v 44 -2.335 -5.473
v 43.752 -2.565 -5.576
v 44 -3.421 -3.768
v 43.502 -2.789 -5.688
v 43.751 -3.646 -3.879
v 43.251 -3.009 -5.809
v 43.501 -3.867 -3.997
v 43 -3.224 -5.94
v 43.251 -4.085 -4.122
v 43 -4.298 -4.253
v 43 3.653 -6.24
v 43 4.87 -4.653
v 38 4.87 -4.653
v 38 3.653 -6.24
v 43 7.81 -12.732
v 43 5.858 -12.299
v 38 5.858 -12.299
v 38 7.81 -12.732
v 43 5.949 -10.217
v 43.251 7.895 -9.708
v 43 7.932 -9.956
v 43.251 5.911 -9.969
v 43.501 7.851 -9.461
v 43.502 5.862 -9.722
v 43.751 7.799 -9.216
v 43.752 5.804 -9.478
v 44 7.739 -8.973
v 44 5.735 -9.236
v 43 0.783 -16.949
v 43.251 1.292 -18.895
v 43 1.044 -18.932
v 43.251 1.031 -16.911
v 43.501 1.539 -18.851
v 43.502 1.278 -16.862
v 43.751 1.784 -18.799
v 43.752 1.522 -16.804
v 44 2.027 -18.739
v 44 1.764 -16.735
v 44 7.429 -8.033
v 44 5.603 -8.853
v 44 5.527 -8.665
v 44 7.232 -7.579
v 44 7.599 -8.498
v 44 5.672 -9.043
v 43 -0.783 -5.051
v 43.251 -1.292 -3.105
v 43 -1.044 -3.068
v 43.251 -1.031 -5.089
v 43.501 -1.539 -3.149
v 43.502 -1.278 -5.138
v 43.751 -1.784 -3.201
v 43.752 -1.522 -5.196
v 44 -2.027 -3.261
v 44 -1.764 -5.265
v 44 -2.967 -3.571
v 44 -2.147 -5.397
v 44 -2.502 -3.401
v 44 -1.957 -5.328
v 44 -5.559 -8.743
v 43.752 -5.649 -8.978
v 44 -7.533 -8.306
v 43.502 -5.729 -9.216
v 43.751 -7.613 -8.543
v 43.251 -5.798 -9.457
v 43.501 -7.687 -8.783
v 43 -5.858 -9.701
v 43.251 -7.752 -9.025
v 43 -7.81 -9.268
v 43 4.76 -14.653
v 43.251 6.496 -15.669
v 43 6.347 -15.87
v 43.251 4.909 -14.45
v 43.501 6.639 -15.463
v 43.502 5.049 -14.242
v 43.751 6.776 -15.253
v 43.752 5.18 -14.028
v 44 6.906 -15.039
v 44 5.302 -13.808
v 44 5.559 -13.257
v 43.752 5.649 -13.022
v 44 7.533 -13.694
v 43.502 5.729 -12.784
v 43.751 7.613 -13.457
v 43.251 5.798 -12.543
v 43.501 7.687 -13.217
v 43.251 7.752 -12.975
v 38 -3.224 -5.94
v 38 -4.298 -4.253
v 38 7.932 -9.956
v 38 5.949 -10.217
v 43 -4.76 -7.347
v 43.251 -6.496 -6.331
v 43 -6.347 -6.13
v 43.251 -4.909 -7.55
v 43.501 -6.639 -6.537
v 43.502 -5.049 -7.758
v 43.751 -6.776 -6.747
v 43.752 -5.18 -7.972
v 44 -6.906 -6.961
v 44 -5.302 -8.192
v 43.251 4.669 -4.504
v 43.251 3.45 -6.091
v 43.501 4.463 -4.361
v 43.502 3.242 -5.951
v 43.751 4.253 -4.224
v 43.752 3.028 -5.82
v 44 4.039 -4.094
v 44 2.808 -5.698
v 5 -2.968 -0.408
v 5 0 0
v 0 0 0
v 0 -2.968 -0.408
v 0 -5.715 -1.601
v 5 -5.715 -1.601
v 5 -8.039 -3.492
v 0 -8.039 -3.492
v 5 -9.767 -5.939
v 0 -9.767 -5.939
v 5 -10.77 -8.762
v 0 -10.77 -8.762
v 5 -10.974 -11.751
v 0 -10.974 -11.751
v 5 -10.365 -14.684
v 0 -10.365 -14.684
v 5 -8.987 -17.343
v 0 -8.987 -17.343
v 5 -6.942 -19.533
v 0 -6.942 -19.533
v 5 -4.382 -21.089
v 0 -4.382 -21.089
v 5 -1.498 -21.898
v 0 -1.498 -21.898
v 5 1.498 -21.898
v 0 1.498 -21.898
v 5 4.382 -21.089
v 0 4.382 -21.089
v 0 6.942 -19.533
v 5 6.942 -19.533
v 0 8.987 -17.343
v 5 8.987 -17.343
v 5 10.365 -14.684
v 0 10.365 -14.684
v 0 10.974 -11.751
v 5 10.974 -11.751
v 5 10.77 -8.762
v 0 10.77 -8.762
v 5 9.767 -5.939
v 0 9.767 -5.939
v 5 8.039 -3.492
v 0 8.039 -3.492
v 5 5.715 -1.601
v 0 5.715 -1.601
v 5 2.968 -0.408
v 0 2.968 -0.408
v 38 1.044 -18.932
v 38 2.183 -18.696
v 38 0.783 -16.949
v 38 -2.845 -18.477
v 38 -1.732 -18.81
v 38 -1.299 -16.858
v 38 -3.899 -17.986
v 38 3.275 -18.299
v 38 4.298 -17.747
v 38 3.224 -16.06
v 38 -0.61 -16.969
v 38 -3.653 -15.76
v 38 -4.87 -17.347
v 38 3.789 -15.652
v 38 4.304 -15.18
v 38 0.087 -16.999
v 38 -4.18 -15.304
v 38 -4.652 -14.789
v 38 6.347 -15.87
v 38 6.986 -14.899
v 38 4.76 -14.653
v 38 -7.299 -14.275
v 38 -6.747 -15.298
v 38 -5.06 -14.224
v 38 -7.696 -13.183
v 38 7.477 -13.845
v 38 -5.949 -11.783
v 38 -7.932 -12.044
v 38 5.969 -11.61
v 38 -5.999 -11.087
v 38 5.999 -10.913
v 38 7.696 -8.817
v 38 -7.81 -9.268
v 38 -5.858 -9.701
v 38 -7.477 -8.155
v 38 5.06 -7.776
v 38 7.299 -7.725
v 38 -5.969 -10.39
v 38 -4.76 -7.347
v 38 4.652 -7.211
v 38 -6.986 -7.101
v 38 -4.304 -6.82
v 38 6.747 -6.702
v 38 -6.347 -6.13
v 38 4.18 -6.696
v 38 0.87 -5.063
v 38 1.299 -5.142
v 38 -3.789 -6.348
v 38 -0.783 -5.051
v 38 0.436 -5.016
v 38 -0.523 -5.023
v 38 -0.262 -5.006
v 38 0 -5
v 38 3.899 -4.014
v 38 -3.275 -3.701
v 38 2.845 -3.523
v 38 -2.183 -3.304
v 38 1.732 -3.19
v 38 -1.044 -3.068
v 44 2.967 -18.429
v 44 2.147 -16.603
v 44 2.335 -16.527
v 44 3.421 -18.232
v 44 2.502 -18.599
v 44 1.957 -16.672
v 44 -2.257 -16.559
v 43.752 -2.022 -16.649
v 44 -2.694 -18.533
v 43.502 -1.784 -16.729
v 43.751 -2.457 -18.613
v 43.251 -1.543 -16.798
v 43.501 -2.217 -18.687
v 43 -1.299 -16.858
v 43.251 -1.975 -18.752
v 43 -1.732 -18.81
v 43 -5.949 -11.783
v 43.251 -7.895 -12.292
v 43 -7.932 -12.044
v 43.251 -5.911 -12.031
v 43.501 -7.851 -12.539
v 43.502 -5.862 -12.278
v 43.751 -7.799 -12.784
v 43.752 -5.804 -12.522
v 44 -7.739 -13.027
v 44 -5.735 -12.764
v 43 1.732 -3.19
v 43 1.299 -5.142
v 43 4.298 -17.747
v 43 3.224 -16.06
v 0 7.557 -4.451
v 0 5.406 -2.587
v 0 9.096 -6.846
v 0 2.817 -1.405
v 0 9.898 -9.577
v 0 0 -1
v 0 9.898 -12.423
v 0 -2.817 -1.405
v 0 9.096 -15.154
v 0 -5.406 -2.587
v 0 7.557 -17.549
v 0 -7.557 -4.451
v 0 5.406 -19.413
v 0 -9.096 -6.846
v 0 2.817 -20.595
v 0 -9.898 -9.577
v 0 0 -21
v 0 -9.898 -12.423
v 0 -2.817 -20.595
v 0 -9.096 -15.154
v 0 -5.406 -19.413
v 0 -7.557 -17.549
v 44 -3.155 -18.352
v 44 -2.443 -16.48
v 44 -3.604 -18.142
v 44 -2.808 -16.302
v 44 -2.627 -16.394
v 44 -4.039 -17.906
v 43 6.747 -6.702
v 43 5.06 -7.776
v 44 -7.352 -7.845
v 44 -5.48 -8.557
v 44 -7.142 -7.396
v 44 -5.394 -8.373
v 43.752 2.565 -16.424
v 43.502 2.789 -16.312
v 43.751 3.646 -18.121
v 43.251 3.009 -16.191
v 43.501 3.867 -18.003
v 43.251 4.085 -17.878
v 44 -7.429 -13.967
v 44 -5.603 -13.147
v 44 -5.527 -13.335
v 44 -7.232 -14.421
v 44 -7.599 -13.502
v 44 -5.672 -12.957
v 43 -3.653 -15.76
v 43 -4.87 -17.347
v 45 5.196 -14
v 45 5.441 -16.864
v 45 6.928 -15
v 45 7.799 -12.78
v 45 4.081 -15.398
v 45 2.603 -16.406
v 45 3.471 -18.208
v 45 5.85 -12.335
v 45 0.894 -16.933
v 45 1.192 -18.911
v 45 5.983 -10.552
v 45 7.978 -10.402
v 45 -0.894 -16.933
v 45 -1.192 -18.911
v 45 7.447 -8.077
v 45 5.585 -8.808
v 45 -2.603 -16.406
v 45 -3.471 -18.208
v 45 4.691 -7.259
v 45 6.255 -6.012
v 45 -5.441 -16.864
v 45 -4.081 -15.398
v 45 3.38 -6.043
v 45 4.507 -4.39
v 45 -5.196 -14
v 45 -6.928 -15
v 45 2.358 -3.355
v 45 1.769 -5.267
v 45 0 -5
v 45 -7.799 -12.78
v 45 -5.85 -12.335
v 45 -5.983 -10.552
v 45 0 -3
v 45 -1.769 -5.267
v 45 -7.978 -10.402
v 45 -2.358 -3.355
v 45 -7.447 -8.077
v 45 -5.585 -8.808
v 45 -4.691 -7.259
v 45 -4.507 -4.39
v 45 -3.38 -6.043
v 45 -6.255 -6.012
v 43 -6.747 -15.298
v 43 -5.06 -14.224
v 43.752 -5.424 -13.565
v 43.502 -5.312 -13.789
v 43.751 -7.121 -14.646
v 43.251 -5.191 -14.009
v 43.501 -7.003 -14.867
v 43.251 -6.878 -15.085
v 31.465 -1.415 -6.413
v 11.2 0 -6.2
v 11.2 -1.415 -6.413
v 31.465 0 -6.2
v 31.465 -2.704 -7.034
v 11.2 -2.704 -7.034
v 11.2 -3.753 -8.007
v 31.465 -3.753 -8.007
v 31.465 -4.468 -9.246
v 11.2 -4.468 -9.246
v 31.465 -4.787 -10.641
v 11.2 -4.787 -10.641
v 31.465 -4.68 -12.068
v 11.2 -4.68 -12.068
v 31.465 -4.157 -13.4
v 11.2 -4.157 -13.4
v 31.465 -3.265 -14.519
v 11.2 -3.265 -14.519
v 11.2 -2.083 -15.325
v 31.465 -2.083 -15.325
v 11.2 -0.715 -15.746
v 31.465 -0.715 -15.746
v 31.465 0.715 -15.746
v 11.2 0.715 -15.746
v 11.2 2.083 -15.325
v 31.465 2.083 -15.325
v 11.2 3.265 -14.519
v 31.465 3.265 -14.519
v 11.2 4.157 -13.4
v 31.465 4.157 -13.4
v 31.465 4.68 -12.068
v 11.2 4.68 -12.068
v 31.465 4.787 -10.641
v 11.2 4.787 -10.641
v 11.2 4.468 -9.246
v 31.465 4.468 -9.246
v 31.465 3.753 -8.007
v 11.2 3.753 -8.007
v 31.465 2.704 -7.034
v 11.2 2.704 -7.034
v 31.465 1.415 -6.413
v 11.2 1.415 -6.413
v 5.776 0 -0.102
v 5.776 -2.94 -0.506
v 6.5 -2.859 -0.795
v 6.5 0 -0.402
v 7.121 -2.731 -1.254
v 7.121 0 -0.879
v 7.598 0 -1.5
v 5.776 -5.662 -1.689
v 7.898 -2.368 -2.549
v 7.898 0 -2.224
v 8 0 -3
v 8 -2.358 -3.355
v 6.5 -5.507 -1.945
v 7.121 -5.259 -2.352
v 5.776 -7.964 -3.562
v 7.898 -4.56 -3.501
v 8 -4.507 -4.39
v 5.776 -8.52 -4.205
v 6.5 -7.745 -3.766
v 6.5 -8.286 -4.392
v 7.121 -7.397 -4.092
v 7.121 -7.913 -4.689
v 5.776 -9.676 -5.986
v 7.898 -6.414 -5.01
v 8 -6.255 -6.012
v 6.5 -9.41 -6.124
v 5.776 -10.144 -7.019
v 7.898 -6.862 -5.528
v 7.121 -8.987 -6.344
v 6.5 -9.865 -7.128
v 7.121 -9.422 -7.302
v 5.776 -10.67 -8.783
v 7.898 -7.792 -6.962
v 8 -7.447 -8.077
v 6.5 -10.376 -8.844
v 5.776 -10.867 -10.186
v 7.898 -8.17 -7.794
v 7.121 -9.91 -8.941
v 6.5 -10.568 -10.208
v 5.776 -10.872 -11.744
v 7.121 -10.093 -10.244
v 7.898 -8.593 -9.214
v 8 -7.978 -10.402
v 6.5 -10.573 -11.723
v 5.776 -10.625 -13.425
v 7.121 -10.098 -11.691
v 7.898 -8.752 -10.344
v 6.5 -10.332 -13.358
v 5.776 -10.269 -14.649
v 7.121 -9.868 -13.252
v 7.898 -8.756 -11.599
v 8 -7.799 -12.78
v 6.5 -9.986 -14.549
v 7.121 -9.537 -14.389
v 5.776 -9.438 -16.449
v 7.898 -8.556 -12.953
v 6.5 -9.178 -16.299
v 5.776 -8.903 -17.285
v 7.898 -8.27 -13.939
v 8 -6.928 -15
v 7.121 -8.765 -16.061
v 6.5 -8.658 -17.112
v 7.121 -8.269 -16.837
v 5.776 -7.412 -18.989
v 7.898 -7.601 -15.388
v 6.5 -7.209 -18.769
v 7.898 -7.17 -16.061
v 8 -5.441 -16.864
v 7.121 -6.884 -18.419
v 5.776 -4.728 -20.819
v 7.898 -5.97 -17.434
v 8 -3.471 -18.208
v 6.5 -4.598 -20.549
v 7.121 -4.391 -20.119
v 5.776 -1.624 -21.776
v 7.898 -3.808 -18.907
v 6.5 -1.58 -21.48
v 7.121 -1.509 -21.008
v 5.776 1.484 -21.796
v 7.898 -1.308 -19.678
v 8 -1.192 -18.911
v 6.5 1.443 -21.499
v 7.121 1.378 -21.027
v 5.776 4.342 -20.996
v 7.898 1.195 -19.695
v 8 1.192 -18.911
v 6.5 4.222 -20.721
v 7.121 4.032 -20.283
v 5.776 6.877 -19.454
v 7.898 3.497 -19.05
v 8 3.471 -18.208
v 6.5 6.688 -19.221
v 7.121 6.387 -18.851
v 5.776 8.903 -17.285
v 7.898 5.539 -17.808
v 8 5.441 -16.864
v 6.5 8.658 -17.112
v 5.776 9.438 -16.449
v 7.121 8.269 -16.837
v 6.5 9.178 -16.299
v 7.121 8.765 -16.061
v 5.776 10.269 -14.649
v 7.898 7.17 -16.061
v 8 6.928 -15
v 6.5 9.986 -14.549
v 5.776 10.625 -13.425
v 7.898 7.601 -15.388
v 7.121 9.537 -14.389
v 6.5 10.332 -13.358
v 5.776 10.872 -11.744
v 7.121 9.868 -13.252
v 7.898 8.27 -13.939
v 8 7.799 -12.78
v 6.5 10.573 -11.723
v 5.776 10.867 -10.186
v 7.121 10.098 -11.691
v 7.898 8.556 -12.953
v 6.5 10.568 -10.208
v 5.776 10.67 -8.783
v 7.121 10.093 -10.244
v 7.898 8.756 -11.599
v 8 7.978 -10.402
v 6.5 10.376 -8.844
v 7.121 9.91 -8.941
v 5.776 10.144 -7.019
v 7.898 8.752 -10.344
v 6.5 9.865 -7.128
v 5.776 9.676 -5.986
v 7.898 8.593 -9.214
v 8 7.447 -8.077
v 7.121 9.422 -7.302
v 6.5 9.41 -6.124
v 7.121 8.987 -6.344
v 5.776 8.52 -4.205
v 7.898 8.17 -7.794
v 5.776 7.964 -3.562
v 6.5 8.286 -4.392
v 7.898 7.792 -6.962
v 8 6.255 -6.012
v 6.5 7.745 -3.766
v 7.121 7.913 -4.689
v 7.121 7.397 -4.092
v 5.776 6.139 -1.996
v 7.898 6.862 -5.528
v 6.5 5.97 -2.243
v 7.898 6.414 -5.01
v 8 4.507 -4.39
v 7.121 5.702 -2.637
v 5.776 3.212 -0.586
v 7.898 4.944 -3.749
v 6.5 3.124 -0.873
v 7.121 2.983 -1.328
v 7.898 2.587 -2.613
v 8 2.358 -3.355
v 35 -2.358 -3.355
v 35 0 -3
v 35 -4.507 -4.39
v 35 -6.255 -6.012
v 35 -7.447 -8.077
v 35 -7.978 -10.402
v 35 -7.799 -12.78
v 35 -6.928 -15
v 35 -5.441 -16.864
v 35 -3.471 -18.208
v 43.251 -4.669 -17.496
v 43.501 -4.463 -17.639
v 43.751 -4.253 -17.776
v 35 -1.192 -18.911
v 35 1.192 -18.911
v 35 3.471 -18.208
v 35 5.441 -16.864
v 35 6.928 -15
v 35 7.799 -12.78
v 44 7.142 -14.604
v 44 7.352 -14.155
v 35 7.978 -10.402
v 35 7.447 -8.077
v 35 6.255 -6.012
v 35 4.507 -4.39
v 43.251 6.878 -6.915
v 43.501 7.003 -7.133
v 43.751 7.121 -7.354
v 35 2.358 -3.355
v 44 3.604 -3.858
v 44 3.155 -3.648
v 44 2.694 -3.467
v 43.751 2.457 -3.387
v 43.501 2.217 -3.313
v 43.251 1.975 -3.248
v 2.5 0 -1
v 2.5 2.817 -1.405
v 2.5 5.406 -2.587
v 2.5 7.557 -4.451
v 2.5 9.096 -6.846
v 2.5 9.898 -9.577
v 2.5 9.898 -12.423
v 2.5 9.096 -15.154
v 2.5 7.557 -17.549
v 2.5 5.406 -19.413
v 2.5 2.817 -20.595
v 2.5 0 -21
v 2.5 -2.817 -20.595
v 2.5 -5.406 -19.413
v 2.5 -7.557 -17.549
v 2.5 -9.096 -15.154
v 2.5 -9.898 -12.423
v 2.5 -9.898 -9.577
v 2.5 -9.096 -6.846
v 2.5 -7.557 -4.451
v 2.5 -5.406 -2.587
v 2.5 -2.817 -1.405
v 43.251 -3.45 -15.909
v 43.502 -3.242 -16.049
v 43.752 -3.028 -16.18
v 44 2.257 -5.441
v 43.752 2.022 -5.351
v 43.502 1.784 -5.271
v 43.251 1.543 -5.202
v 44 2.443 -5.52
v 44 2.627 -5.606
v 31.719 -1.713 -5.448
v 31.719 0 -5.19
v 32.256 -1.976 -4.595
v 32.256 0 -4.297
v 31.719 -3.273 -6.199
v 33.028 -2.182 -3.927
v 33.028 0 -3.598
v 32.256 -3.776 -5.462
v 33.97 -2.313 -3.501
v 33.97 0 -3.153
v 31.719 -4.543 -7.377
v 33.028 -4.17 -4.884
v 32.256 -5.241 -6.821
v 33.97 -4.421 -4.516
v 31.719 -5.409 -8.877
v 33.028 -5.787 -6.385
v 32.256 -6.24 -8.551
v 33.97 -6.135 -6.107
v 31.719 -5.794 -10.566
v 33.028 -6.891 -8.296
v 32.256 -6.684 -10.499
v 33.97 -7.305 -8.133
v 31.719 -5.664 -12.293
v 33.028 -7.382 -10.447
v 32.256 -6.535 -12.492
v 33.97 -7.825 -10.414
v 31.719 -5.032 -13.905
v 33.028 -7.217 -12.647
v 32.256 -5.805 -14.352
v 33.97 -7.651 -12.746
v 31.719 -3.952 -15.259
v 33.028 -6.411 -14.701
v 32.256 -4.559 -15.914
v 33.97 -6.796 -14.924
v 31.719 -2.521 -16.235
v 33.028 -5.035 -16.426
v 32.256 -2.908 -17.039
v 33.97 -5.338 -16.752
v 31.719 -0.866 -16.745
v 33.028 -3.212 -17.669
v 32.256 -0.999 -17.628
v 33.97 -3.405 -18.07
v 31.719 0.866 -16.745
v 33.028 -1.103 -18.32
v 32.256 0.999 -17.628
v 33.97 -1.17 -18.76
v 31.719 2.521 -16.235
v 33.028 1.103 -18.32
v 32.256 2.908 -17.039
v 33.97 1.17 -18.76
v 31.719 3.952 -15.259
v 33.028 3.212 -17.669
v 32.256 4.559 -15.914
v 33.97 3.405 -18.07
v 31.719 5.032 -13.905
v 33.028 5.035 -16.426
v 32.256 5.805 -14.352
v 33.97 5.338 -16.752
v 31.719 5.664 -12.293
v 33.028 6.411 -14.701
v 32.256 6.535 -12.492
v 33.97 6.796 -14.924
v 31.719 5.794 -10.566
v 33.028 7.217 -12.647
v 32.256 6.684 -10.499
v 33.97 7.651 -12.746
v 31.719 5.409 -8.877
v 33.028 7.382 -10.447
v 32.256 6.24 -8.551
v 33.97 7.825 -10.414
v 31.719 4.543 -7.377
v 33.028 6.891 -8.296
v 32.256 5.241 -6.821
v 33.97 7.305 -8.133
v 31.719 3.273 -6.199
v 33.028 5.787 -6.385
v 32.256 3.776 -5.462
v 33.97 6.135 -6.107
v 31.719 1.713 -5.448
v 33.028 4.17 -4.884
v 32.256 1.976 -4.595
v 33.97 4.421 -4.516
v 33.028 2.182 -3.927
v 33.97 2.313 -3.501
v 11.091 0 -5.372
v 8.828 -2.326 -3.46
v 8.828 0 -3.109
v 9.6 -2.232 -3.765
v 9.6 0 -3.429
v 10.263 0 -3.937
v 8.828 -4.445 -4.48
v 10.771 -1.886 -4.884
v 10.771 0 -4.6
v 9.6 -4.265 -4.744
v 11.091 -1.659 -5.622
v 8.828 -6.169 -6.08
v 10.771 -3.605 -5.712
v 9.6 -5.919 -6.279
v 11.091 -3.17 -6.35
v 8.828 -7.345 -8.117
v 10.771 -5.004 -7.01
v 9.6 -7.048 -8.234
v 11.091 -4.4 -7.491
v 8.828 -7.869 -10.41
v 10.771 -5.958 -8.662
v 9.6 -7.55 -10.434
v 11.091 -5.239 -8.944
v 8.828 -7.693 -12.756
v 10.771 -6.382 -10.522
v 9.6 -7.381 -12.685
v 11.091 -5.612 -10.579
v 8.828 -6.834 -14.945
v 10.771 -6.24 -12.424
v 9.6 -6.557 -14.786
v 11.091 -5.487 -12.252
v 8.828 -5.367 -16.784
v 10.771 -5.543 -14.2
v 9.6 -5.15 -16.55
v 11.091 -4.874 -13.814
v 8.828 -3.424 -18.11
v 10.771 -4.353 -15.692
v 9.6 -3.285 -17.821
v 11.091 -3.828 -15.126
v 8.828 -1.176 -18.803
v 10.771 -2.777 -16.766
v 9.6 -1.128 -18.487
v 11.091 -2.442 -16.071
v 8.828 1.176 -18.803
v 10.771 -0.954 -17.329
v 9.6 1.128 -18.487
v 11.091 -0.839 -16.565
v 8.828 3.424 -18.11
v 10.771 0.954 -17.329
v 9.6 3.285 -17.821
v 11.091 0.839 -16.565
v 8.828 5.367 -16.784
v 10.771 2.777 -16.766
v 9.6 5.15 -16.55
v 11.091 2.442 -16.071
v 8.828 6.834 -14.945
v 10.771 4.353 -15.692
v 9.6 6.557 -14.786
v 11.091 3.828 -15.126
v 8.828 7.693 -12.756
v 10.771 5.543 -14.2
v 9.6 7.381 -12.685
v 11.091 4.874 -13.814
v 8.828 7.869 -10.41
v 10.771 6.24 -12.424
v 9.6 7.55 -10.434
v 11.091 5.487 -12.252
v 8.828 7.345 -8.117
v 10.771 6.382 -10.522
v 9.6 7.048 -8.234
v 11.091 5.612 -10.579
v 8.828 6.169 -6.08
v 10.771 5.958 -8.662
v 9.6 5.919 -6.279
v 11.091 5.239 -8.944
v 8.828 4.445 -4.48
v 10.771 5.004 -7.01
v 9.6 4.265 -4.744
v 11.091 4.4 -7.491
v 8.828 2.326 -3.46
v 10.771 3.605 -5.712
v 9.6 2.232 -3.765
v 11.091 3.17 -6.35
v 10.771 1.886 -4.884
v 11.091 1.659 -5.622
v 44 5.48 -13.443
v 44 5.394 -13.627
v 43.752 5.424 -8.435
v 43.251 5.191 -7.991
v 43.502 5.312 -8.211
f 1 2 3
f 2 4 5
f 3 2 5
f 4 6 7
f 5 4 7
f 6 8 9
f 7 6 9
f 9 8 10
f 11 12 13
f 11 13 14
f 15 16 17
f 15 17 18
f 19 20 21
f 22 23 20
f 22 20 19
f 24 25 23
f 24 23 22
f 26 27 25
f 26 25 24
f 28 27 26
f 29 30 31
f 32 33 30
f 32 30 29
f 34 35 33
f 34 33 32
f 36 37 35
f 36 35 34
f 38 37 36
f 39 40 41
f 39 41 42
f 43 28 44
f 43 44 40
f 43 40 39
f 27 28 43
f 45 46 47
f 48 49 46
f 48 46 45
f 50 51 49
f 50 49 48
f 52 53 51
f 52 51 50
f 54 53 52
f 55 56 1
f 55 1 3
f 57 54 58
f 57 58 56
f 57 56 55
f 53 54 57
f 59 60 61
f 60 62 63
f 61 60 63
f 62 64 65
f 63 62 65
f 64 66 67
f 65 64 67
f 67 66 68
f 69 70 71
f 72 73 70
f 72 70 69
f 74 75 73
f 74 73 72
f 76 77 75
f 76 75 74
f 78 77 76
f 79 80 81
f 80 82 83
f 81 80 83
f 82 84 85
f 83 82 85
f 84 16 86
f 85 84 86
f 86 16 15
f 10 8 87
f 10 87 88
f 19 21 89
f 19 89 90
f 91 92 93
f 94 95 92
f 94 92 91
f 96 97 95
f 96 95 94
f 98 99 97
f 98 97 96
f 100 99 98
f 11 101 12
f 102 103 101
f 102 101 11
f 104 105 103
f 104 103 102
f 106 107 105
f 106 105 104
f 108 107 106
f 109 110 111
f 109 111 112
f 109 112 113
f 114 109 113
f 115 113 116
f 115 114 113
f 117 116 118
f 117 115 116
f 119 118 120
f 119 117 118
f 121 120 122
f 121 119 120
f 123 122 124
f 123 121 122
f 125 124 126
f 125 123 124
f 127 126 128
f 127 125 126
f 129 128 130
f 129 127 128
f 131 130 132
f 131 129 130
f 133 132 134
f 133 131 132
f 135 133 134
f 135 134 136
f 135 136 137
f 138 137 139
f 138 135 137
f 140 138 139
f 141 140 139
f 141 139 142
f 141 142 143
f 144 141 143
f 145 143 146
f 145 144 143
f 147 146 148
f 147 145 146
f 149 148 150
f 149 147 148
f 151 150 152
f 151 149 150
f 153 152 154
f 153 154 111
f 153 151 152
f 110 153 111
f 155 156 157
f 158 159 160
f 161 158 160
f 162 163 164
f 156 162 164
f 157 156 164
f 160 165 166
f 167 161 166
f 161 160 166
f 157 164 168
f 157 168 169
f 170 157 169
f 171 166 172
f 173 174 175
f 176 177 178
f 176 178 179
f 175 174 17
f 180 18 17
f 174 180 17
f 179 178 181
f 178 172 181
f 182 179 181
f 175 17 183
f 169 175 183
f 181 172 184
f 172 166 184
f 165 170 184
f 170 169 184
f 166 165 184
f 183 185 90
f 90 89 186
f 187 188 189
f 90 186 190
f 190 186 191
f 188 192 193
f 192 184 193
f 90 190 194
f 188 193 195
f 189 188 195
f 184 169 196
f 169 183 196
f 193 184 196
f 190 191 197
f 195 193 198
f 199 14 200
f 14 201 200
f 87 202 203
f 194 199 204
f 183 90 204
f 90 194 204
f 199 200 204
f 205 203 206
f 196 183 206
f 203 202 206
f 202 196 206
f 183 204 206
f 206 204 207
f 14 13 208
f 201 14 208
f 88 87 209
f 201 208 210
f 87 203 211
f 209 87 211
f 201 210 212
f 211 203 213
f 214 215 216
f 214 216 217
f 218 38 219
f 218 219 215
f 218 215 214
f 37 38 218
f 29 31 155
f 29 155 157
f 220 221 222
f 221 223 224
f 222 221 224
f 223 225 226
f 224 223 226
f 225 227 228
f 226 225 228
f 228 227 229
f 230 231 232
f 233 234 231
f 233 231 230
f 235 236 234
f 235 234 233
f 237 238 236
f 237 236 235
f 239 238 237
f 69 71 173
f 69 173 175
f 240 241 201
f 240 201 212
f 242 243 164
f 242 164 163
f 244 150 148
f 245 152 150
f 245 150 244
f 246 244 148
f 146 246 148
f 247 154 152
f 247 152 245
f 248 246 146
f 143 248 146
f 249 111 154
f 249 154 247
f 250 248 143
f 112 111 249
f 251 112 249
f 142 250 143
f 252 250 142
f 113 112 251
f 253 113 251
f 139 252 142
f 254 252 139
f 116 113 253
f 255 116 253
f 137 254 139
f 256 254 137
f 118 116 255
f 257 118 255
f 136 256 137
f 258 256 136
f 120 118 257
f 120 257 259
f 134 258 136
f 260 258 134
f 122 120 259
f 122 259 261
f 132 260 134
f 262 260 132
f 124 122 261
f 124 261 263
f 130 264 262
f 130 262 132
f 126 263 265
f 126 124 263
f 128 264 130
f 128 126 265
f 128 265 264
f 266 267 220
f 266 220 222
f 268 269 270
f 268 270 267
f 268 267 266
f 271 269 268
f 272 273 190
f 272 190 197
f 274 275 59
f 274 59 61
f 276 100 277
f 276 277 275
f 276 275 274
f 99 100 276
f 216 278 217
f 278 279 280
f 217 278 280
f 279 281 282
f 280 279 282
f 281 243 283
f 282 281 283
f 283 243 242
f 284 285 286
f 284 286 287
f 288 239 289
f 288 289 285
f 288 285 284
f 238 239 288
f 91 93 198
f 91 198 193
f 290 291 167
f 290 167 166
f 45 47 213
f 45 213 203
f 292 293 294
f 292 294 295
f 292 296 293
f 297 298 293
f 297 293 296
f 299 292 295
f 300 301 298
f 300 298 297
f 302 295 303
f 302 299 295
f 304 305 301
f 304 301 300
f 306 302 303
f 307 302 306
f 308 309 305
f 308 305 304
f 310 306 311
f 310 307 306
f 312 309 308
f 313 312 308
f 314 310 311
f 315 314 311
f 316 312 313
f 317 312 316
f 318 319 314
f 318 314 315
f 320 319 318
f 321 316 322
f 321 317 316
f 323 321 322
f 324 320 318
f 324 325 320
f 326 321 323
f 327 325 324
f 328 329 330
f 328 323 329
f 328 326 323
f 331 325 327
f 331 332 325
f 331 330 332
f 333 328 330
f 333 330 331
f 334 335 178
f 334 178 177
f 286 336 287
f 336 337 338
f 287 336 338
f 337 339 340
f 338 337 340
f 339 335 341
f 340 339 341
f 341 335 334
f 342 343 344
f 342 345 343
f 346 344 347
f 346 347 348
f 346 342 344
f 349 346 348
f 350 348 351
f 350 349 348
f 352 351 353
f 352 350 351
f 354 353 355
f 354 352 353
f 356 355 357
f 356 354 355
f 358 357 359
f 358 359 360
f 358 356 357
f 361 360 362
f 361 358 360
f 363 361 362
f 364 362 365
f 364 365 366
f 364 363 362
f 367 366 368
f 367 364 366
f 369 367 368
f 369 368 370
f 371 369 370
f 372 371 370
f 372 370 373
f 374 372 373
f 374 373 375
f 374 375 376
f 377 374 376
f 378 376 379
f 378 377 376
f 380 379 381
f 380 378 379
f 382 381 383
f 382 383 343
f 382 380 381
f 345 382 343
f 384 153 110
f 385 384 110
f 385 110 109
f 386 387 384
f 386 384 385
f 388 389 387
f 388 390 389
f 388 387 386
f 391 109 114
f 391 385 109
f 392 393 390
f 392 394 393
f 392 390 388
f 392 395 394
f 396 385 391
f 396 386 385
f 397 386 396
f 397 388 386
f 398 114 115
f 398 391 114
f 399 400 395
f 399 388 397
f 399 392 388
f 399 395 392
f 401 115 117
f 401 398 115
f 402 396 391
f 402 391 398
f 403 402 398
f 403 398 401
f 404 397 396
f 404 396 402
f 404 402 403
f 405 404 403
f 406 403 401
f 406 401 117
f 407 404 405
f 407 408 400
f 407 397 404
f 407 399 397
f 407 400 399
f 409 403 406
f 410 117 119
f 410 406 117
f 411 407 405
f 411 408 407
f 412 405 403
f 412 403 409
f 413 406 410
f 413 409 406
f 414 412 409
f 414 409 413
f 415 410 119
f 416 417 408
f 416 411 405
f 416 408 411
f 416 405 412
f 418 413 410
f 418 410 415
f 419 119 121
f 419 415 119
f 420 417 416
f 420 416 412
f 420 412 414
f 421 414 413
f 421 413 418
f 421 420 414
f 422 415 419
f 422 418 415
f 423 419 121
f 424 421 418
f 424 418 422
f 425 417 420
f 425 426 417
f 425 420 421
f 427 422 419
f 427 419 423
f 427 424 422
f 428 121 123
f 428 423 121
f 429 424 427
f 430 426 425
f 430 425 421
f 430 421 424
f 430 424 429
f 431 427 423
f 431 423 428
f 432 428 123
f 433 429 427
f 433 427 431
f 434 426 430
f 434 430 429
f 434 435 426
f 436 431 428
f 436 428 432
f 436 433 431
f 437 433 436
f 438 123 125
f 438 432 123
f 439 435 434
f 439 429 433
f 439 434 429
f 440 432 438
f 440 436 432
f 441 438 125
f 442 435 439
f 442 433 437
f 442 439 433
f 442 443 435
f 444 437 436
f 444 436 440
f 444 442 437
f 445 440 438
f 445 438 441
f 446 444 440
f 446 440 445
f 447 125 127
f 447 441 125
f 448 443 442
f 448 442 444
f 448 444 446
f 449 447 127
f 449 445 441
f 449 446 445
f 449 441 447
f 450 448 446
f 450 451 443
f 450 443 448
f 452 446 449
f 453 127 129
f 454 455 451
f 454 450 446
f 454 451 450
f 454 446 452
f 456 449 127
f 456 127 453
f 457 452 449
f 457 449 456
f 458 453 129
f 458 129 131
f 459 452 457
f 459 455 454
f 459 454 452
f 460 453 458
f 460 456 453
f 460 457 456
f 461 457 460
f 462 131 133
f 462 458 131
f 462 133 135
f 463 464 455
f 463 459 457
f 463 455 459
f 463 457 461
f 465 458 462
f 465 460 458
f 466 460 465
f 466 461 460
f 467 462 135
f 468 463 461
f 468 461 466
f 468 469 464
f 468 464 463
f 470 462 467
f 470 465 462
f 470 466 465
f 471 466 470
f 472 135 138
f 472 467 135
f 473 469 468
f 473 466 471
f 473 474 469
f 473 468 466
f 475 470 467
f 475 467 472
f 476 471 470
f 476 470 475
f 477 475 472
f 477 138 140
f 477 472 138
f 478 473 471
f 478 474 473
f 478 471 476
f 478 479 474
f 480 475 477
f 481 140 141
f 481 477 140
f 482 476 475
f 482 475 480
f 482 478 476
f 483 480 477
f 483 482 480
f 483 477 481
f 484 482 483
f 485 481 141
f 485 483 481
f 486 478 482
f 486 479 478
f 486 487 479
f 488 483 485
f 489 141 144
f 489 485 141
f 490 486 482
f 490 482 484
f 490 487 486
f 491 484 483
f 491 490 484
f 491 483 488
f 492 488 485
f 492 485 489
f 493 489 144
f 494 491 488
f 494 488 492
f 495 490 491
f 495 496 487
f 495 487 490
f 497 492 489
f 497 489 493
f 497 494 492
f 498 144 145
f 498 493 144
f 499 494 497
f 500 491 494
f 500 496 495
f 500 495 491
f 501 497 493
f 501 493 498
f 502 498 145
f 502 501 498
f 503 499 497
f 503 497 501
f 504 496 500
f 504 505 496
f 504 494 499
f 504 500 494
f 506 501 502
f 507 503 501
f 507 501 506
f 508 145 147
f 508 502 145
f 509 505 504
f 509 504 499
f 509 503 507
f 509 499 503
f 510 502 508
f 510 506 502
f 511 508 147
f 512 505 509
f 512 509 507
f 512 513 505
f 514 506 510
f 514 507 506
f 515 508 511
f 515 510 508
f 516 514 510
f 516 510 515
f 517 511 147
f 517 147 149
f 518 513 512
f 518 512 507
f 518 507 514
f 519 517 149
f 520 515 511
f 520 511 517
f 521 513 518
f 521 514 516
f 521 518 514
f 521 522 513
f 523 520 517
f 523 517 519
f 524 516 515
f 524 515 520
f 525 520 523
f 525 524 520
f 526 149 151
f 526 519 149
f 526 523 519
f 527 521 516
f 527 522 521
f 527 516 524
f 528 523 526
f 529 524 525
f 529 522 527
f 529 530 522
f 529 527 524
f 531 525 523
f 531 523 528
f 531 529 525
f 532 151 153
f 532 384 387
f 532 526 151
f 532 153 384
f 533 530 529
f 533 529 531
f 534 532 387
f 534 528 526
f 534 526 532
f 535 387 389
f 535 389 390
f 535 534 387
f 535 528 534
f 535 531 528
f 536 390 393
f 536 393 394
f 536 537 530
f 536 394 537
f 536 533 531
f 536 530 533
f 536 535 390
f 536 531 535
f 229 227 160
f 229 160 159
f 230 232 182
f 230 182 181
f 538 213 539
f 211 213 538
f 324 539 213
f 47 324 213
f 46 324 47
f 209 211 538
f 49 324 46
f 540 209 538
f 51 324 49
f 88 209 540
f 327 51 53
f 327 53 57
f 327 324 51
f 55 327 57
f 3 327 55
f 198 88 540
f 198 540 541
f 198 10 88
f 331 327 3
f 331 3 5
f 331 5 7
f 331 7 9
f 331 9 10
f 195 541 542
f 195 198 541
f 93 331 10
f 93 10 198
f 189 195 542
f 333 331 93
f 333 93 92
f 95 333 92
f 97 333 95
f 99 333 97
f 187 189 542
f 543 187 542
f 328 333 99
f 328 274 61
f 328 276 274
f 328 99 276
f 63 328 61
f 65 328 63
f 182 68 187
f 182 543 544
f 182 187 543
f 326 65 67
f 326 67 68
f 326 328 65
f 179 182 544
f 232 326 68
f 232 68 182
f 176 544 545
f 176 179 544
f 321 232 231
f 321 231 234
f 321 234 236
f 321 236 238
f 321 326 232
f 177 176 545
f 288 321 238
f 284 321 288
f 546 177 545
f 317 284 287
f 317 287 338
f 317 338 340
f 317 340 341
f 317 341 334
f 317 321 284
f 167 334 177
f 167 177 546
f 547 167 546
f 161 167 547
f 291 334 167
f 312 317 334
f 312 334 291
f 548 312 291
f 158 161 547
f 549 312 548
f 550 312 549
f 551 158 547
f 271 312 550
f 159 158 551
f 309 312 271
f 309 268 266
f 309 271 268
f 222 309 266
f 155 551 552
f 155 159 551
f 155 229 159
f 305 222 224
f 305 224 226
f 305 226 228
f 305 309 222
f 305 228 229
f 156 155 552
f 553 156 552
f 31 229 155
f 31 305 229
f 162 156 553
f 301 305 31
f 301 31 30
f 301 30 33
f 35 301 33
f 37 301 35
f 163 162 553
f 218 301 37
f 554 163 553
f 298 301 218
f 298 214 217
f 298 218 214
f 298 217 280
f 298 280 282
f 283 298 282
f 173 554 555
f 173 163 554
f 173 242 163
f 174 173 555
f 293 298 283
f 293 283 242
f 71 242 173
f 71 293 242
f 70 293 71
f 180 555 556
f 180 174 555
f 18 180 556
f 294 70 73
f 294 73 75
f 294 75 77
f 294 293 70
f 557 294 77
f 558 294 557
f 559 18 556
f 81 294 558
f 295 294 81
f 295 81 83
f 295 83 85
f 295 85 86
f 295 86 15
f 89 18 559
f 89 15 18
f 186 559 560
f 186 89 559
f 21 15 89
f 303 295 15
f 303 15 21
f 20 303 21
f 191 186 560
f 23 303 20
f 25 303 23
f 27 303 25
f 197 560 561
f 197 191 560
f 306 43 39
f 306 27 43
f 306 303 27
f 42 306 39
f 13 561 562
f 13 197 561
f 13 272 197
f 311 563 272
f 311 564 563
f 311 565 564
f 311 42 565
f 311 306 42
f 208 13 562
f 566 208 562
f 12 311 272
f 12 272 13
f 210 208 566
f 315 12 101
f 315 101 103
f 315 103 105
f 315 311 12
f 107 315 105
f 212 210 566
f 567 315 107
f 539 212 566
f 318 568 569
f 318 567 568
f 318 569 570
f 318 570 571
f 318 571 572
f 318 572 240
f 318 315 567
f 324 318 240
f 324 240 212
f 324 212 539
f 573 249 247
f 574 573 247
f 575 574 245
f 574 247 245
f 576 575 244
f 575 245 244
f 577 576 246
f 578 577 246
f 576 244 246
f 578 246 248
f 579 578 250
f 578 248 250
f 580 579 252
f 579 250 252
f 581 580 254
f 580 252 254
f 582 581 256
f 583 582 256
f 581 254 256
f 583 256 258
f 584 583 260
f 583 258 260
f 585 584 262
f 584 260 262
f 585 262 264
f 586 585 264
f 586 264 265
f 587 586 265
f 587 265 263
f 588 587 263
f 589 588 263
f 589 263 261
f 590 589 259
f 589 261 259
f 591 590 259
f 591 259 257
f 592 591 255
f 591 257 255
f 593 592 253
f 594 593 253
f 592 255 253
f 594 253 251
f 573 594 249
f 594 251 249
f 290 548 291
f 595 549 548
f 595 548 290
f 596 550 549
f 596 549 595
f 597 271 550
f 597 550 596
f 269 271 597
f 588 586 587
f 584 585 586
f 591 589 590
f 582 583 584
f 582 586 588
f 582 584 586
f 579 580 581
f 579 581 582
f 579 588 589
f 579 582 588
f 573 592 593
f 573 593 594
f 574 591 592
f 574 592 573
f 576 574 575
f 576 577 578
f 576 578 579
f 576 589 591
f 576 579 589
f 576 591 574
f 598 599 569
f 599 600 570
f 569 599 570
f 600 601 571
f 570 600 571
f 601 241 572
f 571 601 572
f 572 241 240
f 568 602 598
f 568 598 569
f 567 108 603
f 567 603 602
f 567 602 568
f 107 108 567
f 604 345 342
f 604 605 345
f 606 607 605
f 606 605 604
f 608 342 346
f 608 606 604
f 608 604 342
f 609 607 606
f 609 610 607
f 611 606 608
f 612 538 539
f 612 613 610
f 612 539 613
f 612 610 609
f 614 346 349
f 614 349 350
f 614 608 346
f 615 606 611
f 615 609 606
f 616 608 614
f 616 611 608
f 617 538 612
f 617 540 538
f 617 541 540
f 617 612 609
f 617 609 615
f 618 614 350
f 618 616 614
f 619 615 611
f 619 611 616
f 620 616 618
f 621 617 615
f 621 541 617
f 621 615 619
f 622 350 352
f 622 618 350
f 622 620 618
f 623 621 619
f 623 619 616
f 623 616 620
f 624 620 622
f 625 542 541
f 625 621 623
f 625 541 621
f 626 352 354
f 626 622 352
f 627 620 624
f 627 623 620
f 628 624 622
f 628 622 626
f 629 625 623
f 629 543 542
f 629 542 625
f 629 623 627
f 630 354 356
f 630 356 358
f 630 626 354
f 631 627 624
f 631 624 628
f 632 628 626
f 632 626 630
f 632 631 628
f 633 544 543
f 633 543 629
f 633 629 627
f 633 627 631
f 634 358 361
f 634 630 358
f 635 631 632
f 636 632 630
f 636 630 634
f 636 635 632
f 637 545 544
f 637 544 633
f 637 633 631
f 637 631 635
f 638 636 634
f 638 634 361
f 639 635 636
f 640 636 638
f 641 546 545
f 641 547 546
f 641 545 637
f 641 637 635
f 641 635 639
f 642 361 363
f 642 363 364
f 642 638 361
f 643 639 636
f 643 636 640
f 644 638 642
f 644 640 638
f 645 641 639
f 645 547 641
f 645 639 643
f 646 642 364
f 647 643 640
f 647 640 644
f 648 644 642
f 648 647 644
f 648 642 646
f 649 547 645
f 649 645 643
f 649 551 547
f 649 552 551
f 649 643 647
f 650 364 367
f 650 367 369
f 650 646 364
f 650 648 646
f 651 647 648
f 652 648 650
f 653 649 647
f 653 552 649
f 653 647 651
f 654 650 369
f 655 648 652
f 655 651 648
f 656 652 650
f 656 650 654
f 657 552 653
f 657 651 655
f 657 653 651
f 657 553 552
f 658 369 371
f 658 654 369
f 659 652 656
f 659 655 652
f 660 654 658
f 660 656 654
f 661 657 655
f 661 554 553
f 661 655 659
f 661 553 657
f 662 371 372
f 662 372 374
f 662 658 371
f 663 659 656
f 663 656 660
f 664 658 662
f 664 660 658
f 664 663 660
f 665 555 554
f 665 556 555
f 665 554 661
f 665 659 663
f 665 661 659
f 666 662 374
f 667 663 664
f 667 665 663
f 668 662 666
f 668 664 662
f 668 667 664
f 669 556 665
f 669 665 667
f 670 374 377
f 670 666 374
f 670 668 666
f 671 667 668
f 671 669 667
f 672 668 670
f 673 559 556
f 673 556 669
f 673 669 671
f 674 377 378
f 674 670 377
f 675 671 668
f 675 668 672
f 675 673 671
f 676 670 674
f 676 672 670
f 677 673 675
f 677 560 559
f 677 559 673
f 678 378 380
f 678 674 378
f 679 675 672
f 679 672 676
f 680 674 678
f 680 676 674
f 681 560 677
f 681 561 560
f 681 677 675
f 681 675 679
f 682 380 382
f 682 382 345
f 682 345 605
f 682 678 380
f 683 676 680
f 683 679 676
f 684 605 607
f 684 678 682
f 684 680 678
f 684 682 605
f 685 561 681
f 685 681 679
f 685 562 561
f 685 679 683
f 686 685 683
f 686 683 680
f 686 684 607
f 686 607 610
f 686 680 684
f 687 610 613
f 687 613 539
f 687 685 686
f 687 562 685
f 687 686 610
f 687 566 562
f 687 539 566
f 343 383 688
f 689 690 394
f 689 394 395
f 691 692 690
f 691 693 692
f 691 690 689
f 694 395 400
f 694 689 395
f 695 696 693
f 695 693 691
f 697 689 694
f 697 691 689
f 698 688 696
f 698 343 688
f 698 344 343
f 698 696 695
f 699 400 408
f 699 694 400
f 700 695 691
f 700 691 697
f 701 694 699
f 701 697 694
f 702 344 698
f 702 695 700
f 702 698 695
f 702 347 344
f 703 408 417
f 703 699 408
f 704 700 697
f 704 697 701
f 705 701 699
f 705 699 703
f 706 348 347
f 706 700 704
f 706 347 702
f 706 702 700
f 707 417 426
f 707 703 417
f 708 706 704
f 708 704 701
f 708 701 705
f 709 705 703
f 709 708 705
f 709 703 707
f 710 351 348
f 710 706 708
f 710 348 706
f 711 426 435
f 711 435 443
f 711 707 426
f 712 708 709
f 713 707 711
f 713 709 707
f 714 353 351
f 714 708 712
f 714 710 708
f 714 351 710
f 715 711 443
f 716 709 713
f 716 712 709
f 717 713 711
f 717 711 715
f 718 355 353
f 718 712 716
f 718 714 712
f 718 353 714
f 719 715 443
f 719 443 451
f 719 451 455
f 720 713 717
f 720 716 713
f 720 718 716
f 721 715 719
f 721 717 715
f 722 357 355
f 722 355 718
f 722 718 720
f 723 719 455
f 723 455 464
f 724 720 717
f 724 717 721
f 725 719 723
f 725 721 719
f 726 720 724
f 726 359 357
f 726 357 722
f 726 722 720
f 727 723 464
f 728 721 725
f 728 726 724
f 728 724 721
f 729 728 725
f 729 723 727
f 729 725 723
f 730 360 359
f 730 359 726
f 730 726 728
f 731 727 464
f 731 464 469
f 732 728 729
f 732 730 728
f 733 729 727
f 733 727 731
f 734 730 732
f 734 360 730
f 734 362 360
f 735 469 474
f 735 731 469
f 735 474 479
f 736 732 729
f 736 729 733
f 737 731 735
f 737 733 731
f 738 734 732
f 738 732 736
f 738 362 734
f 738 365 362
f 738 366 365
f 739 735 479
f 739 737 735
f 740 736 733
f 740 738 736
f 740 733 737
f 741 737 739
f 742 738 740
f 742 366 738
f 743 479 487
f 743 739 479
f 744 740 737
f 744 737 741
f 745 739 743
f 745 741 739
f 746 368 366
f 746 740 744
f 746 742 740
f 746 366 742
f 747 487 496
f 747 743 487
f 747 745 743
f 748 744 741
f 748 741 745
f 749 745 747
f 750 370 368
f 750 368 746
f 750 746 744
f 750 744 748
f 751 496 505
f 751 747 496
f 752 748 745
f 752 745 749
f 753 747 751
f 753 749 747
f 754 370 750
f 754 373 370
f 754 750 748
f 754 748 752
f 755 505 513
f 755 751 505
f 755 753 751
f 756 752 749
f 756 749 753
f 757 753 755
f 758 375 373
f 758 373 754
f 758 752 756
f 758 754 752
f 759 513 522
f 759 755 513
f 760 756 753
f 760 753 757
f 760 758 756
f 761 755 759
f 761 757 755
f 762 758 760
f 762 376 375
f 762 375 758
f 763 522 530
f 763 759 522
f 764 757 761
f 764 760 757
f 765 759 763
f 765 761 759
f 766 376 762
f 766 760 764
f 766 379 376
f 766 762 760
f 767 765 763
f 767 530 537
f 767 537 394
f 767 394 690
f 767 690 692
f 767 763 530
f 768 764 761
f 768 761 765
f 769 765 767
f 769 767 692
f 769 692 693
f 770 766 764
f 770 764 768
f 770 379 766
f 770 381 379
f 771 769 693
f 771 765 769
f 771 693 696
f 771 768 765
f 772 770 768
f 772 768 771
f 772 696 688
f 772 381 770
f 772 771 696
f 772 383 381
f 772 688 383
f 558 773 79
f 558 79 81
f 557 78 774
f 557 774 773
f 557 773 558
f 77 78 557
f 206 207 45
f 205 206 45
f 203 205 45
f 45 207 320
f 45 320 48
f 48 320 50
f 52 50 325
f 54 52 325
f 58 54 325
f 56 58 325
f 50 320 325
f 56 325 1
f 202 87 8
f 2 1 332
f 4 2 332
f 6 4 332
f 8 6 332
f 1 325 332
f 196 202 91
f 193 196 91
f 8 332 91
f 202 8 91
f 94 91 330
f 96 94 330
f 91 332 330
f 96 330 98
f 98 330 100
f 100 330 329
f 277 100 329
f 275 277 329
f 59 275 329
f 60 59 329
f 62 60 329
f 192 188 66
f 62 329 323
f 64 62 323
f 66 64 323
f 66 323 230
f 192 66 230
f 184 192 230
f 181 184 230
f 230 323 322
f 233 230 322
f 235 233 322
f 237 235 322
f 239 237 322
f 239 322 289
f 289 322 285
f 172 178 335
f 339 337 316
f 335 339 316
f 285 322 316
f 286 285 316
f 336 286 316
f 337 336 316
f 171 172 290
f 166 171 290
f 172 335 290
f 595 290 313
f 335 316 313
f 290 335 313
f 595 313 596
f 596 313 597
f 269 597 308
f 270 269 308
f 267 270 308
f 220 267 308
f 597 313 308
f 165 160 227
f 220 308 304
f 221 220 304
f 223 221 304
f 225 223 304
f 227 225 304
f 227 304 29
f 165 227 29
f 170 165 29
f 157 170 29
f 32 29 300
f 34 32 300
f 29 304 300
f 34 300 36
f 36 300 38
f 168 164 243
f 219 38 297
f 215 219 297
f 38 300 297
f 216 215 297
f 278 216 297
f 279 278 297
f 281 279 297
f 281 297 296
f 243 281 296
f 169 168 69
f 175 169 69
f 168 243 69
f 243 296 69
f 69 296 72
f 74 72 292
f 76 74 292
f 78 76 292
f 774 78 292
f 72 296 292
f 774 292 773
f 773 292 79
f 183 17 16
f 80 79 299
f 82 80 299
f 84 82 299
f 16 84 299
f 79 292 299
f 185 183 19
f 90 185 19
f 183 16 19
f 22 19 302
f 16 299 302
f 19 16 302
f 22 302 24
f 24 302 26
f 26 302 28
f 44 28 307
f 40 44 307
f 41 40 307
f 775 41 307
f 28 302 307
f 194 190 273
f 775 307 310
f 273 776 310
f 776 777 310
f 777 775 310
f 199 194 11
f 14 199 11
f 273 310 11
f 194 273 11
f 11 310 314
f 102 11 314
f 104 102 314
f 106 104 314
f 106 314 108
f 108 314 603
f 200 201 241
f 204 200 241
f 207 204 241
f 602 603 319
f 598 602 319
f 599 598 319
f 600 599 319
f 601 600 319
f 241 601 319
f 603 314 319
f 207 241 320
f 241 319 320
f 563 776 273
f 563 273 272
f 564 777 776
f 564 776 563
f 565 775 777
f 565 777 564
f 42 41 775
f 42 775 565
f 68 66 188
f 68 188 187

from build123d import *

# Parameters (mm, degrees)
SKETCH_2_R               = 10
CUT_EXTRUDE_1_DEPTH      = 2.5
CUT_EXTRUDE_START        = 6
CUT_EXTRUDE_2_DEPTH      = 6
PATTERN_CIRCULAR_1_COUNT = 8
CHAMFER_4_SIZE           = 1
CHAMFER_5_SIZE           = 1
CHAMFER_6_SIZE           = 1


with BuildPart() as part:
    # Эскиз1 → Повернуть11 (revolve)
    with BuildSketch(Plane(origin=(0, 0, 0), x_dir=(1, 0, 0), z_dir=(0, 1, 0))):
        with BuildLine():
            Line((0, 11), (0, 0))
            Line((0, 0), (5, 0))
            Line((5, 0), (5, 3))
            Line((5, 3), (8, 3))
            ThreePointArc((8, 3), (10.2627417, 3.9372583), (11.2, 6.2))
            Line((11.2, 6.2), (31.465178427, 6.2))
            ThreePointArc((31.465178427, 6.2), (32.615940251, 3.918829982), (35, 3))
            Line((35, 3), (45, 3))
            Line((45, 3), (45, 5))
            Line((45, 5), (38, 5))
            Line((38, 5), (38, 11))
            Line((38, 11), (0, 11))
        make_face()
    revolve(axis=Axis((0, 0, -11), (1, 0, 0)))

    # Эскиз2 → Вырез-Вытянуть1 (cut)
    with BuildSketch(Plane.ZY):
        with Locations((-11, 0)):
            Circle(SKETCH_2_R)
    extrude(amount=-CUT_EXTRUDE_1_DEPTH, mode=Mode.SUBTRACT)

    # Эскиз6 → Вырез-Вытянуть2 (cut)
    with BuildSketch(Plane(origin=(38, 0, 0), x_dir=(0, 0, -1), z_dir=(1, 0, 0)).offset(CUT_EXTRUDE_START)):
        with BuildLine():
            Line((4.653173278, 4.870091432), (6.239879958, 3.652568574))
            ThreePointArc((6.239879958, 3.652568574), (5.562153278, 2.53570957), (5.142223957, 1.298637684))
            Line((5.142223957, 1.298637684), (3.189631943, 1.731516912))
            ThreePointArc((3.189631943, 1.731516912), (3.749537704, 3.380946094), (4.653173278, 4.870091432))
        make_face()
    cut_extrude_2 = extrude(amount=-CUT_EXTRUDE_2_DEPTH, mode=Mode.SUBTRACT)

    # Круговой массив1: Вырез-Вытянуть2 ×8 about axis
    pattern_circular_1_axis = Axis((45, 0, -11), (-1, 0, 0))
    for i in range(1, PATTERN_CIRCULAR_1_COUNT):
        add(cut_extrude_2.rotate(pattern_circular_1_axis, i * 360 / PATTERN_CIRCULAR_1_COUNT), mode=Mode.SUBTRACT)

    # Эскиз1<12> → Повернуть12 (revolve)
    with BuildSketch(Plane(origin=(0, 0, 0), x_dir=(1, 0, 0), z_dir=(0, 1, 0))):
        with BuildLine():
            Line((5, 3), (5, 0))
            ThreePointArc((5, 0), (7.121320344, 0.878679656), (8, 3))
            Line((8, 3), (5, 3))
        make_face()
    revolve(axis=Axis((0, 0, -11), (1, 0, 0)))

    # Фаска4
    chamfer_4_edges = [part.edges().sort_by_distance(p)[0] for p in [
        (44, 3.761097258, -16.903740121),
        (44, 0.913683346, -17.94011403),
    ]]
    chamfer(chamfer_4_edges, length=CHAMFER_4_SIZE)

    # Фаска5
    chamfer_5_edges = [part.edges().sort_by_distance(p)[0] for p in [
        (44, 5.553473382, -15.261330003),
        (44, 6.83407205, -12.515077298),
    ]]
    chamfer(chamfer_5_edges, length=CHAMFER_5_SIZE)

    # Фаска6
    chamfer_6_edges = [part.edges().sort_by_distance(p)[0] for p in [
        (44, -1.515077298, -17.83407205),
        (44, -4.261330003, -16.553473382),
        (44, -6.94011403, -11.913683346),
        (44, -5.903740121, -14.761097258),
        (44, -6.83407205, -9.484922702),
        (44, -5.553473382, -6.738669997),
        (44, -3.761097258, -5.096259879),
        (44, -0.913683346, -4.05988597),
        (44, 1.515077298, -4.16592795),
        (44, 4.261330003, -5.446526618),
        (44, 5.903740121, -7.238902742),
        (44, 6.94011403, -10.086316654),
    ]]
    chamfer(chamfer_6_edges, length=CHAMFER_6_SIZE)


solid = part.part
